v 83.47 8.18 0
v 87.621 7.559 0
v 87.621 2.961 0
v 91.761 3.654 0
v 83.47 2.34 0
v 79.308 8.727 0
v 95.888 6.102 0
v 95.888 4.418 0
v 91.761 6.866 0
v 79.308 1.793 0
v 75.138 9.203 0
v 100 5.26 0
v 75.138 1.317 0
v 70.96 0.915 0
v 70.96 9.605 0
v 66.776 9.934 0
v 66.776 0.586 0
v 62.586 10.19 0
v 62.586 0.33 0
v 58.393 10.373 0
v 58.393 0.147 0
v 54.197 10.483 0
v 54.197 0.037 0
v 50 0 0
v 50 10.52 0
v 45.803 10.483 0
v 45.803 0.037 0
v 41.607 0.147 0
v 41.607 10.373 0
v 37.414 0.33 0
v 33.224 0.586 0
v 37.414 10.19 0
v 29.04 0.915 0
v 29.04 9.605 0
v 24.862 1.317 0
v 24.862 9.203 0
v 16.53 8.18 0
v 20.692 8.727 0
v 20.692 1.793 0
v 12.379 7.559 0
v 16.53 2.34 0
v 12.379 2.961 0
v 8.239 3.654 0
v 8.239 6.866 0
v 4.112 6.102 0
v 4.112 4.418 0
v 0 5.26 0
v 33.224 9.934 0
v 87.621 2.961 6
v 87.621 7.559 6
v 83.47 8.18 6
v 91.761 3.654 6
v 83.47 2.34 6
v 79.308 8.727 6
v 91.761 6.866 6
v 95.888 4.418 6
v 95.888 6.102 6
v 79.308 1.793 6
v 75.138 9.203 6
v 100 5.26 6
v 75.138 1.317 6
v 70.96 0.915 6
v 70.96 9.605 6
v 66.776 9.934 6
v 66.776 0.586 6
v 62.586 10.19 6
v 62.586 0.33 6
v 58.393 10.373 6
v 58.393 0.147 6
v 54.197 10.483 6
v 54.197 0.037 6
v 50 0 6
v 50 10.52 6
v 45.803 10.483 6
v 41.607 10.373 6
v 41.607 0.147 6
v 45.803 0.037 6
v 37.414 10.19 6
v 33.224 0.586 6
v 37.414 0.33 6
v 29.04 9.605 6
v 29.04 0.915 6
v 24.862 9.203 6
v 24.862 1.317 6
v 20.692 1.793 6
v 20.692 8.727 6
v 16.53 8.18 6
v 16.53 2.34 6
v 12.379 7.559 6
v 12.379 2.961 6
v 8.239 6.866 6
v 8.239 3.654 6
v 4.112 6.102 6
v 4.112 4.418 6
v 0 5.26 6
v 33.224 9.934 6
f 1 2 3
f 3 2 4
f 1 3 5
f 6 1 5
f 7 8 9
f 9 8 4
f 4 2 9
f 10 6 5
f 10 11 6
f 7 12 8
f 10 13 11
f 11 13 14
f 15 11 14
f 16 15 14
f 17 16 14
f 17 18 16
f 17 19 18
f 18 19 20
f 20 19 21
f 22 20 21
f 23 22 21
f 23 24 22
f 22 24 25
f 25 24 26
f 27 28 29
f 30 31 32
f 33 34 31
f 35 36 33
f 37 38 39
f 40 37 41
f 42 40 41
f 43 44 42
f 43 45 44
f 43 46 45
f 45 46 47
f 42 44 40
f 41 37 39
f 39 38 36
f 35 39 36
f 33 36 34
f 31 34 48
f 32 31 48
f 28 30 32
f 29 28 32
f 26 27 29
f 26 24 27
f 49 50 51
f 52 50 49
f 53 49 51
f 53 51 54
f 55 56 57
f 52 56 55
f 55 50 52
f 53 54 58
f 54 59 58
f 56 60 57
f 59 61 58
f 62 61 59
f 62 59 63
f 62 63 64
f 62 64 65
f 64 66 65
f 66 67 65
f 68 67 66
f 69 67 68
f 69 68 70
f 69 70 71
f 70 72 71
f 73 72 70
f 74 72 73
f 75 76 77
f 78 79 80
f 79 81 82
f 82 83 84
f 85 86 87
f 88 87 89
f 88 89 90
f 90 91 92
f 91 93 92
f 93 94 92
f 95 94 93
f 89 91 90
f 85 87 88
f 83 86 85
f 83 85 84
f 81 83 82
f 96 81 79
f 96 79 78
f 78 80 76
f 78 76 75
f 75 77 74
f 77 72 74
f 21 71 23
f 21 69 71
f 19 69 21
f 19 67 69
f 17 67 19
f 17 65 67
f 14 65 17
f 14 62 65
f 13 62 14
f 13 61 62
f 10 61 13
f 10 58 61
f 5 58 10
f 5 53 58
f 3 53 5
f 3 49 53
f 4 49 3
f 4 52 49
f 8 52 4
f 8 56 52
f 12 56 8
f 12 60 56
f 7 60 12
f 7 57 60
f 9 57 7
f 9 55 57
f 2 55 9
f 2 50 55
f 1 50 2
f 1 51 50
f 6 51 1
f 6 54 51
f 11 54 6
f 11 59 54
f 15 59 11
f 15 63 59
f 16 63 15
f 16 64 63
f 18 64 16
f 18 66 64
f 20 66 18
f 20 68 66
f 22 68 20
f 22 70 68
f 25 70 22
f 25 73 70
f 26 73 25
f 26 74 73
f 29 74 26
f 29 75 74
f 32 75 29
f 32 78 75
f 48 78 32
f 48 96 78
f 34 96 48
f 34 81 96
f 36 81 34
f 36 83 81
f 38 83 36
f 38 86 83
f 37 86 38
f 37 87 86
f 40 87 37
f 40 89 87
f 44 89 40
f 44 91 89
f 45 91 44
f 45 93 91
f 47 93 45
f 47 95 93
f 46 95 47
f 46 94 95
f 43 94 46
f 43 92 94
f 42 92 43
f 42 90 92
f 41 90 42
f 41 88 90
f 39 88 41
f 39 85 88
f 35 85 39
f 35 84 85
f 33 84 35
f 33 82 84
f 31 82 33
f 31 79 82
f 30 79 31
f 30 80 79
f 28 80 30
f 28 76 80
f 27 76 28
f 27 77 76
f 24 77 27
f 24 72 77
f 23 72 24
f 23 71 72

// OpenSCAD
$fn = 32;

// ----------------------------------------------------------------------
// Arc profile plate: lens, 48 points
// ----------------------------------------------------------------------

// --- parameters (mm) ---
lens_chord = 100;         // chord length of the lens, X
arc_r = 240.49;           // radius of both arcs
arc_angle = 24;           // angle of each arc, degrees
sagitta = 5.26;           // bulge of each arc (half the lens height)
arc_step = 1;             // sampling step of the arcs, degrees
plate_t = 6;              // plate thickness, Z
fit_tol = 0.05;           // declared fit tolerance (prompt contract)
free_tol = 0.2;           // declared free tolerance (prompt contract)

bbox_y = 2 * sagitta;  // full lens height

profile = [[100, 5.26], [95.888, 6.102], [91.761, 6.866], [87.621, 7.559], [83.47, 8.18], [79.308, 8.727], [75.138, 9.203], [70.96, 9.605], [66.776, 9.934], [62.586, 10.19], [58.393, 10.373], [54.197, 10.483], [50, 10.52], [45.803, 10.483], [41.607, 10.373], [37.414, 10.19], [33.224, 9.934], [29.04, 9.605], [24.862, 9.203], [20.692, 8.727], [16.53, 8.18], [12.379, 7.559], [8.239, 6.866], [4.112, 6.102], [0, 5.26], [4.112, 4.418], [8.239, 3.654], [12.379, 2.961], [16.53, 2.34], [20.692, 1.793], [24.862, 1.317], [29.04, 0.915], [33.224, 0.586], [37.414, 0.33], [41.607, 0.147], [45.803, 0.037], [50, 0], [54.197, 0.037], [58.393, 0.147], [62.586, 0.33], [66.776, 0.586], [70.96, 0.915], [75.138, 1.317], [79.308, 1.793], [83.47, 2.34], [87.621, 2.961], [91.761, 3.654], [95.888, 4.418]];  // primary outline, 48 points, counter clockwise

// --- the one profile operation ---
linear_extrude(height = plate_t) polygon(points = profile);
